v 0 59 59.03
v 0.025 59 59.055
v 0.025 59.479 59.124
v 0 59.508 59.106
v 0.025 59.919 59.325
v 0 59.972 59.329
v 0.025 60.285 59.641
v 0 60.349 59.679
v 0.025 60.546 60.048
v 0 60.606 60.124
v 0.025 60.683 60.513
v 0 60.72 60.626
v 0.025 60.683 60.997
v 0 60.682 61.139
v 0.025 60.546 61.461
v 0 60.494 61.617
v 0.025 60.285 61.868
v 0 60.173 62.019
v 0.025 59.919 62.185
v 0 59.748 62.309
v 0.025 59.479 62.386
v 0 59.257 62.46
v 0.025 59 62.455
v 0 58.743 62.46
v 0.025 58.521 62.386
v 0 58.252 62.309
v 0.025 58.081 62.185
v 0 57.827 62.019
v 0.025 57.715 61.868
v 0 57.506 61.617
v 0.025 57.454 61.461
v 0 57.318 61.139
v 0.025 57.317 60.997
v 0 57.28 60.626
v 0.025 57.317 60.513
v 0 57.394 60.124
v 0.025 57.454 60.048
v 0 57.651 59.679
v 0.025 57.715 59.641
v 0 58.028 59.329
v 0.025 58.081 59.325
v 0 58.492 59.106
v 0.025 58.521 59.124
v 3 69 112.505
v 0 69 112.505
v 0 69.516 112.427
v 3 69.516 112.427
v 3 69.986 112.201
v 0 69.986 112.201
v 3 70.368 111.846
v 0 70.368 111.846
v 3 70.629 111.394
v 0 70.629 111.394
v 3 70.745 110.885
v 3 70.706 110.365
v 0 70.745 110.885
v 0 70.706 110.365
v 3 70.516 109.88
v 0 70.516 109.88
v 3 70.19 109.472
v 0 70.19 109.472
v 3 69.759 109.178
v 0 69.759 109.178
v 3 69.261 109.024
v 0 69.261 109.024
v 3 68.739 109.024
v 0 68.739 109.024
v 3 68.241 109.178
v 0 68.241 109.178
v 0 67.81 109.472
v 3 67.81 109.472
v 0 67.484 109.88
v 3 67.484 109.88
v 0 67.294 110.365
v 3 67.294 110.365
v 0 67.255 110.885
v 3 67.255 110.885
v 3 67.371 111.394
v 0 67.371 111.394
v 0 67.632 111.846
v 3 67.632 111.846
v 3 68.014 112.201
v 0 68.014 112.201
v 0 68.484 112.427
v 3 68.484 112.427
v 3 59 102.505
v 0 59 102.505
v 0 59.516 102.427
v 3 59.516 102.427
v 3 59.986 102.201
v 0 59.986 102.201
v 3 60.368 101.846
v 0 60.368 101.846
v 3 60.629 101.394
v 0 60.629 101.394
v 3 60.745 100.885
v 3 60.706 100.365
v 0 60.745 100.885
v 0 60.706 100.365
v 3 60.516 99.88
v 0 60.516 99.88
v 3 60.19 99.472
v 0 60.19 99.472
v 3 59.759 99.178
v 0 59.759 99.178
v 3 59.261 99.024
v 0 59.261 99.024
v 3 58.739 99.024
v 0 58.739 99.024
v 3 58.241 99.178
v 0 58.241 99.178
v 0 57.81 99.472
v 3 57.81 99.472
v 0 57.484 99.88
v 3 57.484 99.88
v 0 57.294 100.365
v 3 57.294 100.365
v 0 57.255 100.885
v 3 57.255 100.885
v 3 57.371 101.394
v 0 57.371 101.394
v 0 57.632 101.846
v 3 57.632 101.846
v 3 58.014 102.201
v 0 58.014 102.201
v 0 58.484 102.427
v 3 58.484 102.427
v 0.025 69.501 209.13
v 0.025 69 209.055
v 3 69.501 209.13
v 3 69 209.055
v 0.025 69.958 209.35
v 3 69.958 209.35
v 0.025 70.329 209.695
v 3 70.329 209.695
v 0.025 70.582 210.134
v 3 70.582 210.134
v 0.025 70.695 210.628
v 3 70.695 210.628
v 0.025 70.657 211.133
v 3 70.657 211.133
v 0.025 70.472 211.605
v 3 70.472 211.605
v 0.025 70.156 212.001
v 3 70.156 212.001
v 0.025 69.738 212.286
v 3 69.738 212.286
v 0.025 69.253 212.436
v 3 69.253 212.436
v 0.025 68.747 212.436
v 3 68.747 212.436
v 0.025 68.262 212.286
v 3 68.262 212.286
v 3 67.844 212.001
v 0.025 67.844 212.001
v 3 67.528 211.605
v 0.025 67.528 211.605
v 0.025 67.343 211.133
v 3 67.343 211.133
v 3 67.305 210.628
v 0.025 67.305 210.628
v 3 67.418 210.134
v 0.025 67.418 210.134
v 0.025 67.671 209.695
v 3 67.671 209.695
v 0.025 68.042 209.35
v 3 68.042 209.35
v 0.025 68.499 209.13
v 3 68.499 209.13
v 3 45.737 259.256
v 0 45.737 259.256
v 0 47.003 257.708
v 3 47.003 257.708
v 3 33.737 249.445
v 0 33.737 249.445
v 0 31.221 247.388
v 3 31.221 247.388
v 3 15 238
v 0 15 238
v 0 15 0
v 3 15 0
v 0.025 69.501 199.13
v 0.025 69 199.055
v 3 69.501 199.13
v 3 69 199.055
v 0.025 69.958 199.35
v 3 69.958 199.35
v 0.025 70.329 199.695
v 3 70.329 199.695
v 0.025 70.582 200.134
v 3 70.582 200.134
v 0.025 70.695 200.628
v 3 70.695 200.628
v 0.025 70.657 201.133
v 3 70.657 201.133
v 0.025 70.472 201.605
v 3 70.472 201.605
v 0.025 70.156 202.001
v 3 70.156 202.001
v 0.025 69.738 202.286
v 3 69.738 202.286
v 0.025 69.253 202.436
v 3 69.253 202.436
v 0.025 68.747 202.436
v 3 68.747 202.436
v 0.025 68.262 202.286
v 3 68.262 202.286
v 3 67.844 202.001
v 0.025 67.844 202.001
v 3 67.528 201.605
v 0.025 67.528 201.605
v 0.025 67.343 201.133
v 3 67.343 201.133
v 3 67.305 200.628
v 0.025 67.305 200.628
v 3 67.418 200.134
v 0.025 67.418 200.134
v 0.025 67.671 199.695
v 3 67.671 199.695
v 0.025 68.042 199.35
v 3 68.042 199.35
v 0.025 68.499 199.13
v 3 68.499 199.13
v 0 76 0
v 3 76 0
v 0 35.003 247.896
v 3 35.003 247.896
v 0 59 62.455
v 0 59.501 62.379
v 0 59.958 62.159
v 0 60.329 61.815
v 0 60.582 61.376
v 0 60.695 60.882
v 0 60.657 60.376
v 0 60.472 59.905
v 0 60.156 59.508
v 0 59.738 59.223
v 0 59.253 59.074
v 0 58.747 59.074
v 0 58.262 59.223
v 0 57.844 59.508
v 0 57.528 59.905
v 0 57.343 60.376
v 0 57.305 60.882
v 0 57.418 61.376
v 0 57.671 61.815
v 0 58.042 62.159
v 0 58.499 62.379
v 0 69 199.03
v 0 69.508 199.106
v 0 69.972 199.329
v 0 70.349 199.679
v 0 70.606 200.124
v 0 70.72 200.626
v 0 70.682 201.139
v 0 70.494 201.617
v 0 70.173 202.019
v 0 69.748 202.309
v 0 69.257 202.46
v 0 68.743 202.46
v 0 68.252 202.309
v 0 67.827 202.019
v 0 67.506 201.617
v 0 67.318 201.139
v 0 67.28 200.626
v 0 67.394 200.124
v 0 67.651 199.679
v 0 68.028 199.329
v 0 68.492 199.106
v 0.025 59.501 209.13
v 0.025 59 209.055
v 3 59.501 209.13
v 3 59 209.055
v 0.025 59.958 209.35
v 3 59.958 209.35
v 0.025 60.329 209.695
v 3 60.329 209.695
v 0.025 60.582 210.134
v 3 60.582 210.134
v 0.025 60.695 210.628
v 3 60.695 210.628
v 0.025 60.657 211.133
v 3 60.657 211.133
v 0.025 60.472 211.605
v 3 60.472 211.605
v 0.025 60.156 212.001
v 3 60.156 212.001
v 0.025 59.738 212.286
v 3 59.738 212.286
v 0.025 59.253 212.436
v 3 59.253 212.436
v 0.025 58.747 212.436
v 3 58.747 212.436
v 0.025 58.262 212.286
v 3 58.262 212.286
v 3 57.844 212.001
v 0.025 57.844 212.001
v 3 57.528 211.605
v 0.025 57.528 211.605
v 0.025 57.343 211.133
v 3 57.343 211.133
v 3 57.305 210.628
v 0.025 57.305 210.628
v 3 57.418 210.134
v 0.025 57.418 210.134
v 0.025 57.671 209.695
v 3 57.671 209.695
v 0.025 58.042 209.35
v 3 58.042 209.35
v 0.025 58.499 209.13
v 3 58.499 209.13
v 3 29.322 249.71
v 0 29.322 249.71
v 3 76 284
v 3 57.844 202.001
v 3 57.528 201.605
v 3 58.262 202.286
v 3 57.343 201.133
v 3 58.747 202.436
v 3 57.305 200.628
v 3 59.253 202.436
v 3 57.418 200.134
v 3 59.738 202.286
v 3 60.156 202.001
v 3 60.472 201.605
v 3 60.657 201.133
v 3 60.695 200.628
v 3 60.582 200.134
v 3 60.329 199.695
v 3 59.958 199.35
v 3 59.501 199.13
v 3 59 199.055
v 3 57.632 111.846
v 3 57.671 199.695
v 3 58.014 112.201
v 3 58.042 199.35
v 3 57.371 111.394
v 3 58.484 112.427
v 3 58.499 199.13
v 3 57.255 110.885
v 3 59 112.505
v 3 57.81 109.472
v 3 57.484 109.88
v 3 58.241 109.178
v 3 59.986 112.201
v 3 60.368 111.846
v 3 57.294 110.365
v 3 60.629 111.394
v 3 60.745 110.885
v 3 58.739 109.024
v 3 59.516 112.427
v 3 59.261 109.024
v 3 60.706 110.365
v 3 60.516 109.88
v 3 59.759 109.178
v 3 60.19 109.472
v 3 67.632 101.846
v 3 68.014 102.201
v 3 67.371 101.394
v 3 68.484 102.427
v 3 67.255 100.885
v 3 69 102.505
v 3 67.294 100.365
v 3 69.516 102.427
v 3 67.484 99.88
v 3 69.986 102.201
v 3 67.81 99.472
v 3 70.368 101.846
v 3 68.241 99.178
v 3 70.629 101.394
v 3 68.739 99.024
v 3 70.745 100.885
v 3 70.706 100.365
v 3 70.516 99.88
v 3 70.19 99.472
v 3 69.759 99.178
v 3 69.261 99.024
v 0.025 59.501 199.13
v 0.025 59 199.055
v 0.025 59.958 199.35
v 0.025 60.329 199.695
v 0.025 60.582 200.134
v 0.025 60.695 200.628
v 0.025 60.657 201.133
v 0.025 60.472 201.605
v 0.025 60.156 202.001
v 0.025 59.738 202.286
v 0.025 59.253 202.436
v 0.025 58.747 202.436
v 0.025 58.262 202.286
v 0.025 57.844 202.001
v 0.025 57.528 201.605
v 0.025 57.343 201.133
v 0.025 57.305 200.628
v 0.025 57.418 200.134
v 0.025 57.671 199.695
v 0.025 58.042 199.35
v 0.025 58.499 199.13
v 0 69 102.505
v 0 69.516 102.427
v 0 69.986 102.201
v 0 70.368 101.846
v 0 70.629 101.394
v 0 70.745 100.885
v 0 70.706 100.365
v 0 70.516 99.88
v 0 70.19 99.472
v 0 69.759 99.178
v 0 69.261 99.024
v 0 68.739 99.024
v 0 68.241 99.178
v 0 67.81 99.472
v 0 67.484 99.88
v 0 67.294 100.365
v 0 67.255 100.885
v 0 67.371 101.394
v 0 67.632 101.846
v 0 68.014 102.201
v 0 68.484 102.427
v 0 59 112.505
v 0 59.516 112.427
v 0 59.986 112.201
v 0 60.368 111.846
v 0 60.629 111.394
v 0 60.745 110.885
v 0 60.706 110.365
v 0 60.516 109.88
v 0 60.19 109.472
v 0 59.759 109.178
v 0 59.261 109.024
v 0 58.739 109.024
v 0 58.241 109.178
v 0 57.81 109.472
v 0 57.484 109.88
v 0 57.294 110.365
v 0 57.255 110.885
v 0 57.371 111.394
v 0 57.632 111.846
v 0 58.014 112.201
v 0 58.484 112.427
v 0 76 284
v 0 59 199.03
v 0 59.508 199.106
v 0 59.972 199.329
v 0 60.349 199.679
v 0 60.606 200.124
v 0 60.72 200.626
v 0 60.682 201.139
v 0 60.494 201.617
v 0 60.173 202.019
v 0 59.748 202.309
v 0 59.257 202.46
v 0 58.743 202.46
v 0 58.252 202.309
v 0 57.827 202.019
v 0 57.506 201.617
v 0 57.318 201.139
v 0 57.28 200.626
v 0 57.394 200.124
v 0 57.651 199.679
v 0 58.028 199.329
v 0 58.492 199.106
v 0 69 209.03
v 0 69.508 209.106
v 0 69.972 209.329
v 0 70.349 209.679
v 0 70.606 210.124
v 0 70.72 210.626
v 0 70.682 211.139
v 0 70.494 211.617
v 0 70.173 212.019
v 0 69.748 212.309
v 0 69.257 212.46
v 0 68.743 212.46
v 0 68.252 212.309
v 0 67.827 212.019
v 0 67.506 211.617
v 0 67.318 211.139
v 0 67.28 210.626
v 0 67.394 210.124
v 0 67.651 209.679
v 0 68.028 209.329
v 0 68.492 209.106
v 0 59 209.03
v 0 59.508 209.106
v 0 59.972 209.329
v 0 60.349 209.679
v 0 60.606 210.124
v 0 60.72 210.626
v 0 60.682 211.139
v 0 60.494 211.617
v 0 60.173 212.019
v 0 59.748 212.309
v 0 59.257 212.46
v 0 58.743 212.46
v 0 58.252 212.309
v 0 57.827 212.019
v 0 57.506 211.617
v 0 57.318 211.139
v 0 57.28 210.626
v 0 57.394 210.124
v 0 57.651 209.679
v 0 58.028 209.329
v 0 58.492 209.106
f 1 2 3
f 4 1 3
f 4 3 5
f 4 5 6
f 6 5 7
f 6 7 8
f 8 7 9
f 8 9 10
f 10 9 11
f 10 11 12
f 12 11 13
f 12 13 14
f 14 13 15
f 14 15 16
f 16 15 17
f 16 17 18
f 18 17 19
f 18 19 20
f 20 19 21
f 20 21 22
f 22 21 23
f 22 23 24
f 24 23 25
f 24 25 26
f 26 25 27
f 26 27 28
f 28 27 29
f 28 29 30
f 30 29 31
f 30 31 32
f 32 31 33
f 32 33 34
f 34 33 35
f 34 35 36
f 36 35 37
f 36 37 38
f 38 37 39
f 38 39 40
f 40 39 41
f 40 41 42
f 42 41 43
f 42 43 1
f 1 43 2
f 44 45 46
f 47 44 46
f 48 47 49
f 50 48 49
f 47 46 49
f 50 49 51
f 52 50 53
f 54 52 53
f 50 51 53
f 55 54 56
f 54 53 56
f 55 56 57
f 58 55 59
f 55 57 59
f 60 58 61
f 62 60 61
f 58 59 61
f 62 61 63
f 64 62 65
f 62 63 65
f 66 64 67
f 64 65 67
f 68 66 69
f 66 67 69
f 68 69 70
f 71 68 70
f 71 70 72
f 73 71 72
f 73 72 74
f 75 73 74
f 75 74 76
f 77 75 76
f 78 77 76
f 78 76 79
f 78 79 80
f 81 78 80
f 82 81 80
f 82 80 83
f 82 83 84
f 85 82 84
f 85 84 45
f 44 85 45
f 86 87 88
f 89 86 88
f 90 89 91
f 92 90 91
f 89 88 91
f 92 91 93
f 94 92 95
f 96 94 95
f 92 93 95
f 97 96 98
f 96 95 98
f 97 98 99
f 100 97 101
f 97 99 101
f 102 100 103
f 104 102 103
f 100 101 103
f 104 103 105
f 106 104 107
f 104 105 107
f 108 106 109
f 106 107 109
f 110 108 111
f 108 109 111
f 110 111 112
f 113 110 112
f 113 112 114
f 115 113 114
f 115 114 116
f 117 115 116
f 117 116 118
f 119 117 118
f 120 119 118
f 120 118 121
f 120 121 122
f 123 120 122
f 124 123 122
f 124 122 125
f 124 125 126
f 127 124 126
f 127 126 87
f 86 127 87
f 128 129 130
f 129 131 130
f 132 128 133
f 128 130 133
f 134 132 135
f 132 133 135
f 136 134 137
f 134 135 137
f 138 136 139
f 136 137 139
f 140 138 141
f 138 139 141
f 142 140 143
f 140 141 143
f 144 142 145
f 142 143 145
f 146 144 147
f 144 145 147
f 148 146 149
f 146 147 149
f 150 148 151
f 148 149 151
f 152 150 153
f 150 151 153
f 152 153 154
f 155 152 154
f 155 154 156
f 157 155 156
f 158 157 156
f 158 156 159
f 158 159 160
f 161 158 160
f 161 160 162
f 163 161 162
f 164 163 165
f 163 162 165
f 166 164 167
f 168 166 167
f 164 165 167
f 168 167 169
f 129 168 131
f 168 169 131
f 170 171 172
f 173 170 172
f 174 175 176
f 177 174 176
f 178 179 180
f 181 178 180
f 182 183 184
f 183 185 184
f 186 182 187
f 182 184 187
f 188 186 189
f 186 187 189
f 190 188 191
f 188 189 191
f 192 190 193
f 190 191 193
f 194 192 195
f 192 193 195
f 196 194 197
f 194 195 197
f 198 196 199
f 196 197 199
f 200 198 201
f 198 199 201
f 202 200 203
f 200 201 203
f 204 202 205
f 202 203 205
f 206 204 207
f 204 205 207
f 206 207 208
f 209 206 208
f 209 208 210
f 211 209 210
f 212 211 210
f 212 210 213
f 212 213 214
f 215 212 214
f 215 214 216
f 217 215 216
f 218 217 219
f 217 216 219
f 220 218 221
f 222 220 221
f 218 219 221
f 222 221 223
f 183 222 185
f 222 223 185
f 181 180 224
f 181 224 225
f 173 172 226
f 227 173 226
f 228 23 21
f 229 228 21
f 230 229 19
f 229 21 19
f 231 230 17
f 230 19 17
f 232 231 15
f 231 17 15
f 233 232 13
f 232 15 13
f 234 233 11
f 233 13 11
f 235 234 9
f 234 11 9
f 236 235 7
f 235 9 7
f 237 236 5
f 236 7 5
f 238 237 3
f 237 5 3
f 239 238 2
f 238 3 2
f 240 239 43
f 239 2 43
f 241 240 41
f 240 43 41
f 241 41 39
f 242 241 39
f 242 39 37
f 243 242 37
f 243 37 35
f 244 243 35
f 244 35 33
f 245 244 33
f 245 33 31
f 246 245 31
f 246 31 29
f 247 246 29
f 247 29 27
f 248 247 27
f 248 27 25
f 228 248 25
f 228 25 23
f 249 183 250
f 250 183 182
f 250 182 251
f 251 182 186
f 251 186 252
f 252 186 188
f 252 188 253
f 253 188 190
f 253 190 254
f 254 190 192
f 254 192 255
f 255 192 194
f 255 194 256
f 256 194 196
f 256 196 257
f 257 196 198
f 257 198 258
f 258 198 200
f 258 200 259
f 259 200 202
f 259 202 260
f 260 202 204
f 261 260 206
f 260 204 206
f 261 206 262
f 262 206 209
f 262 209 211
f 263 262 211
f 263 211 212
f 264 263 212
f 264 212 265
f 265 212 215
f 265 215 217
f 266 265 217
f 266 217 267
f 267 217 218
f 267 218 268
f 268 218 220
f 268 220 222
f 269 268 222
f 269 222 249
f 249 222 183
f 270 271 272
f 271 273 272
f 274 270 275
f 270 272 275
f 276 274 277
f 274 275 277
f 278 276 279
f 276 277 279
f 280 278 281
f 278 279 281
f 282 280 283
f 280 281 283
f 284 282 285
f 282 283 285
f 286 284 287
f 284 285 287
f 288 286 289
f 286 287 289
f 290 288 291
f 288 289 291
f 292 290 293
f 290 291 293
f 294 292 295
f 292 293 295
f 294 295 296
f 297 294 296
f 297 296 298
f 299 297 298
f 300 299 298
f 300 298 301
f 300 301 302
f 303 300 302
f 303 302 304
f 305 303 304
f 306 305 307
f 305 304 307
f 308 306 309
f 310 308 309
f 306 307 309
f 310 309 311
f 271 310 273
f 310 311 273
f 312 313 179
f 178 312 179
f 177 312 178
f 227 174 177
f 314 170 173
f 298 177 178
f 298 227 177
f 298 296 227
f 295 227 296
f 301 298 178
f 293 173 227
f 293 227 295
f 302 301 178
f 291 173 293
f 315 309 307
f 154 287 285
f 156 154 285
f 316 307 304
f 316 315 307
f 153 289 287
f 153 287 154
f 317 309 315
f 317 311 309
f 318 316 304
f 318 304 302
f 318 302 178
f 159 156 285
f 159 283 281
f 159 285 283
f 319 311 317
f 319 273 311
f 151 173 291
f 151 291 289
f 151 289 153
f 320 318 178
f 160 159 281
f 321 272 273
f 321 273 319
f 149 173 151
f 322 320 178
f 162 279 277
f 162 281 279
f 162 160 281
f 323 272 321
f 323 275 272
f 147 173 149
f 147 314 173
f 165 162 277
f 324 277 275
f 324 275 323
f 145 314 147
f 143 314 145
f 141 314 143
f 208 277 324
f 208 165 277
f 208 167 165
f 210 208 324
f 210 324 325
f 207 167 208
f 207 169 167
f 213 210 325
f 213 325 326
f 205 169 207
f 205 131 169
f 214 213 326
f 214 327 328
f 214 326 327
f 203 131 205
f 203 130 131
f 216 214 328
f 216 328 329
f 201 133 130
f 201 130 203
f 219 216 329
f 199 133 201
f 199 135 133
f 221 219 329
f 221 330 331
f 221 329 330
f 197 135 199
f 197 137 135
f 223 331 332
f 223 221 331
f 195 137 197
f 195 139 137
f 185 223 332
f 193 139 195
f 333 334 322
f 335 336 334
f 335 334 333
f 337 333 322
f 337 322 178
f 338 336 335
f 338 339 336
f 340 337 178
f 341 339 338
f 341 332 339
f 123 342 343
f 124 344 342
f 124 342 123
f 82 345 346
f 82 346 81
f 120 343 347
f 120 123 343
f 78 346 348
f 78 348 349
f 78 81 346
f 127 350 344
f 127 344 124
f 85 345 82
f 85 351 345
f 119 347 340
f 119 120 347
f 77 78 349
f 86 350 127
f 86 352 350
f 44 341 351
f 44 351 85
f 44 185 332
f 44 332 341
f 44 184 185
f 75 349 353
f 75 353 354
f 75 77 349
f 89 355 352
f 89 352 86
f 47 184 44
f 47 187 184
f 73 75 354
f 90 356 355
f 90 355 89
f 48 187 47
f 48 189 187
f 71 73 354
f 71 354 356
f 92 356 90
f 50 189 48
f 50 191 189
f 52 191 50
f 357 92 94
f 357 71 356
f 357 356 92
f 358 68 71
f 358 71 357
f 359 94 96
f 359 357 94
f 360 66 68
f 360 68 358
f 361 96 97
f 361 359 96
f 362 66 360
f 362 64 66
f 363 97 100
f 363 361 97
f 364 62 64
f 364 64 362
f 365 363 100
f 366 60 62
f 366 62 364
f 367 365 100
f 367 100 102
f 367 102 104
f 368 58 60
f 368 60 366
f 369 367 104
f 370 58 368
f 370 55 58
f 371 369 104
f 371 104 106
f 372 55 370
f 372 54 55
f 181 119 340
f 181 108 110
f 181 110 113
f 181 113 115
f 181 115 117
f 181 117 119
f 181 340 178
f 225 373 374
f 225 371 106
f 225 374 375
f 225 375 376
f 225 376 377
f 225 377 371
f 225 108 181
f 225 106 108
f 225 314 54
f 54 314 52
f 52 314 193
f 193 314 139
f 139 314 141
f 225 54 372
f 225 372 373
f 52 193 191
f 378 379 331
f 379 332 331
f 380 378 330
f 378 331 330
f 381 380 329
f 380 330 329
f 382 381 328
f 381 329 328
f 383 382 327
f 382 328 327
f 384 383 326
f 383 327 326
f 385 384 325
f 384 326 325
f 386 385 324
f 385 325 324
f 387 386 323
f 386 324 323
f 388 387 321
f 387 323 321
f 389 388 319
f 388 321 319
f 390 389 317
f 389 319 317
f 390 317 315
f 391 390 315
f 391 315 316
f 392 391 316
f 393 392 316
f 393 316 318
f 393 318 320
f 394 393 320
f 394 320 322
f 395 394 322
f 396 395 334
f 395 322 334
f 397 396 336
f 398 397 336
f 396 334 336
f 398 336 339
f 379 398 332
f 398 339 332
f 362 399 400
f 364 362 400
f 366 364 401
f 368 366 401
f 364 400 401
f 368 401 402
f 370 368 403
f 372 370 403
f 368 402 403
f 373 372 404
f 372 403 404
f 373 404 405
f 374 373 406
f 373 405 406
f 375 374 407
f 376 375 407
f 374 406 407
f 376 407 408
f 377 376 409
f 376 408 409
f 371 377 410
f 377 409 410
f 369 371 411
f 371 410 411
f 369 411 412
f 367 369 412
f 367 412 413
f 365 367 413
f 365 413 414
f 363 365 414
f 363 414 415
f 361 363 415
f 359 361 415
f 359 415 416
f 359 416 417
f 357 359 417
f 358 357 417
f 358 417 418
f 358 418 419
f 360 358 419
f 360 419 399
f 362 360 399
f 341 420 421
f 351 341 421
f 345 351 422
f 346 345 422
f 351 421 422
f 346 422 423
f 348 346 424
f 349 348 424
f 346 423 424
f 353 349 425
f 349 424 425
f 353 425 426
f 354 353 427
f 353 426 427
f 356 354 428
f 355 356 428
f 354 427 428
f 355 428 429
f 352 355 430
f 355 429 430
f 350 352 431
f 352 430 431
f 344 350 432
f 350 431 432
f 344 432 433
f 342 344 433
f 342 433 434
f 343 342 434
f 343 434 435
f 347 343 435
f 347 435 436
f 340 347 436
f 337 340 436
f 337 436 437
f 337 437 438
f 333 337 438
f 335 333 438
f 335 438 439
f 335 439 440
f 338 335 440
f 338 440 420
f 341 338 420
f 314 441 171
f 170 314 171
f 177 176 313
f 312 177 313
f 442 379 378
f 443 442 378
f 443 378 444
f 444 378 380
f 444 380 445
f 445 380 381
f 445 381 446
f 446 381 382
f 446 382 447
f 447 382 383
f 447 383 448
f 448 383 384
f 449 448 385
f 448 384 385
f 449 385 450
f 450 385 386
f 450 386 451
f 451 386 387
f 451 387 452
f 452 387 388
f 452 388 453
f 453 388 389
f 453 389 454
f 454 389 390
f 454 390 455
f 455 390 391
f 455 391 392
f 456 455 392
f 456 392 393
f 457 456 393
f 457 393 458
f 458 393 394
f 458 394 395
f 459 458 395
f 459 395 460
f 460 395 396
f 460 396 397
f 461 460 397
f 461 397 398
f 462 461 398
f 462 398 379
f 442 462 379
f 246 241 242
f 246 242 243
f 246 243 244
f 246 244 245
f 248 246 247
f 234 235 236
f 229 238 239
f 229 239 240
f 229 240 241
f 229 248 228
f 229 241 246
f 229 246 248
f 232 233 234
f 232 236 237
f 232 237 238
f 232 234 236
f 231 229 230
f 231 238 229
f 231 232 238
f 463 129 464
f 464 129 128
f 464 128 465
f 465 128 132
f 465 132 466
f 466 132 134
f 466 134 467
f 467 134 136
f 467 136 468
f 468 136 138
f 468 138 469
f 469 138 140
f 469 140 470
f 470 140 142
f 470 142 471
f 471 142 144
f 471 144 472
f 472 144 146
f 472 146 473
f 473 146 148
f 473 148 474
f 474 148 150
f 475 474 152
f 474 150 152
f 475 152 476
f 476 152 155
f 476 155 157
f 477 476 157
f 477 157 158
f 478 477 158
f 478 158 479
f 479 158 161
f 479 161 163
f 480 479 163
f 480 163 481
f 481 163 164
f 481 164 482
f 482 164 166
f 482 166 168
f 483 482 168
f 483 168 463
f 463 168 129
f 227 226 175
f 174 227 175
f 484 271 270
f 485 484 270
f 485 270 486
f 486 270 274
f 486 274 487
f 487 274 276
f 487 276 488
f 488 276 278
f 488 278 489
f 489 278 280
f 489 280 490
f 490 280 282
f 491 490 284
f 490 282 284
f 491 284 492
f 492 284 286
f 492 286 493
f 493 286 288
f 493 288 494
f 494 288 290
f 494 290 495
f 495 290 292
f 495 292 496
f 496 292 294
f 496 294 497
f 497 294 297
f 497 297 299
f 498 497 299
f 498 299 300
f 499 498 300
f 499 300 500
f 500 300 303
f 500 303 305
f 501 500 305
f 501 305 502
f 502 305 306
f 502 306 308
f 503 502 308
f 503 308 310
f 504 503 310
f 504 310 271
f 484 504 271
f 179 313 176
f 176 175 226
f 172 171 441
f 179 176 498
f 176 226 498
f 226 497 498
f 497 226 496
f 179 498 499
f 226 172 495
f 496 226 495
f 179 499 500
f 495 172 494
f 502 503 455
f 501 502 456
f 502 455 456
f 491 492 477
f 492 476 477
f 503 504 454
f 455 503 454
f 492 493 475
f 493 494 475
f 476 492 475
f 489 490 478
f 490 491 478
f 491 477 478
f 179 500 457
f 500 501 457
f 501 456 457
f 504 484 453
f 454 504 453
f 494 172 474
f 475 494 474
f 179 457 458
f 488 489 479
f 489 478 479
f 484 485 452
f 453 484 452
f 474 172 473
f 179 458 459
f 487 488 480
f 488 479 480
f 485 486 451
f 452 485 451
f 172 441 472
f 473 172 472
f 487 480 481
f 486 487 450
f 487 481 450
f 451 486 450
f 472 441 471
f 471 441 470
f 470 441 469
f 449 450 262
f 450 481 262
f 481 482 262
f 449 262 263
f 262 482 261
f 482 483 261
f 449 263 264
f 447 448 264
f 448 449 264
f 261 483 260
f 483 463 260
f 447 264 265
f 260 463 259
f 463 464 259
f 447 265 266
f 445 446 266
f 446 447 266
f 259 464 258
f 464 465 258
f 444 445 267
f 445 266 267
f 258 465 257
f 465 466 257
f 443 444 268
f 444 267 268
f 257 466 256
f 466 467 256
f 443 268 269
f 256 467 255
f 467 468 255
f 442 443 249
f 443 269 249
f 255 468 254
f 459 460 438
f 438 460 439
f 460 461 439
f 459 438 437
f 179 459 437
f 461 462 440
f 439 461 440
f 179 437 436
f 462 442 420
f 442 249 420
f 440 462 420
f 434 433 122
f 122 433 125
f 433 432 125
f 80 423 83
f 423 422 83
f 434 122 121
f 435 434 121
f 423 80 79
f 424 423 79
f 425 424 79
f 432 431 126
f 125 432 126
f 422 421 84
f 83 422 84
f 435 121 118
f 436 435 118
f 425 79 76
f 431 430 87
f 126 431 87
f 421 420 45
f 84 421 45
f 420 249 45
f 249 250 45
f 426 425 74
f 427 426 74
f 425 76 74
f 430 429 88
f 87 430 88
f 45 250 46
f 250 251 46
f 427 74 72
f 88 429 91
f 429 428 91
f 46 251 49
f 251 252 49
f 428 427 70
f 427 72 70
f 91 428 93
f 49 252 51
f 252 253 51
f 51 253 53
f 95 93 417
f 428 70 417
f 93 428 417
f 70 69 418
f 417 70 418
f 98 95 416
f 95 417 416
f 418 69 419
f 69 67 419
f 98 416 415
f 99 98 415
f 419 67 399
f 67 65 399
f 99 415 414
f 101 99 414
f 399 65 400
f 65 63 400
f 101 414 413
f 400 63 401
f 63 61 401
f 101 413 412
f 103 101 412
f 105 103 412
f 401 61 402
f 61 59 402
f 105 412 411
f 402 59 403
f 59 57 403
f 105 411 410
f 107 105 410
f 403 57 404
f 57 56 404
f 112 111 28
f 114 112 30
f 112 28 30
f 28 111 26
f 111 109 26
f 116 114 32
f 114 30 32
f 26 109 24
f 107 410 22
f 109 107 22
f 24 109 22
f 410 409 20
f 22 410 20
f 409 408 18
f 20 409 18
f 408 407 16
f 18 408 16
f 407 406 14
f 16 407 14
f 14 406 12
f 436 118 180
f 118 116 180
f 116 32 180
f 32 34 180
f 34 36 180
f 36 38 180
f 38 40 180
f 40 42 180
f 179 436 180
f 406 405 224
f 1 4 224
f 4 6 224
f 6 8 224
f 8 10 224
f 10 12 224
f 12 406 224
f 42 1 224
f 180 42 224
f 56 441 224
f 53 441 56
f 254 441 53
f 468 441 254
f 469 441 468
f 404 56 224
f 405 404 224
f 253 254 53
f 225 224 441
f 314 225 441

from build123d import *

# Parameters (mm, degrees)
SKETCH1_W                      = 3
SKETCH1_H                      = 76
BOSS_EXTRUDE1_DEPTH            = 220
M3_CLEARANCE_HOLE1_D           = 3.4
M3_CLEARANCE_HOLE1_CSINK_D     = 3.45
M3_CLEARANCE_HOLE1_CSINK_ANGLE = 90
SKETCH4_W                      = 220
SKETCH4_H                      = 15
CUT_EXTRUDE1_DEPTH             = 233.776717049
SKETCH5_R                      = 1.75
CUT_EXTRUDE2_DEPTH             = 233.776717049
BOSS_EXTRUDE2_START            = -3
SKETCH6_R                      = 1.725
SKETCH6_R_2                    = 1.7
BOSS_EXTRUDE2_DEPTH            = 3
BOSS_EXTRUDE3_DEPTH            = 3


with BuildPart() as part:
    # Sketch1 → Boss-Extrude1 (new body)
    with BuildSketch(Plane.XY):
        with Locations((1.5, 38)):
            Rectangle(SKETCH1_W, SKETCH1_H)
    extrude(amount=BOSS_EXTRUDE1_DEPTH)

    # M3 Clearance Hole1 (through all)
    with Locations(Plane.ZY):
        with Locations((50.754682085, 59), (60.754682085, 59), (60.754682085, 69), (50.754682085, 69), (200.754682085, 59), (200.754682085, 69), (210.754682085, 59), (210.754682085, 69)):
            CounterSinkHole(M3_CLEARANCE_HOLE1_D / 2, M3_CLEARANCE_HOLE1_CSINK_D / 2, counter_sink_angle=M3_CLEARANCE_HOLE1_CSINK_ANGLE)

    # Sketch4 → Cut-Extrude1 (cut, through all)
    with BuildSketch(Plane.ZY):
        with Locations((110, 7.5)):
            Rectangle(SKETCH4_W, SKETCH4_H)
    extrude(amount=-CUT_EXTRUDE1_DEPTH, mode=Mode.SUBTRACT)

    # Sketch5 → Cut-Extrude2 (cut, through all)
    with BuildSketch(Plane.ZY):
        with Locations((110.754682085, 69)):
            Circle(SKETCH5_R)
        with Locations((100.754682085, 69)):
            Circle(SKETCH5_R)
        with Locations((100.754682085, 59)):
            Circle(SKETCH5_R)
        with Locations((110.754682085, 59)):
            Circle(SKETCH5_R)
    extrude(amount=-CUT_EXTRUDE2_DEPTH, mode=Mode.SUBTRACT)

    # Sketch6 → Boss-Extrude2 (add)
    with BuildSketch(Plane.ZY.offset(BOSS_EXTRUDE2_START)):
        with Locations((50.754682085, 59)):
            Circle(SKETCH6_R)
        with Locations((60.754682085, 59)):
            Circle(SKETCH6_R_2)
        with Locations((60.754682085, 69)):
            Circle(SKETCH6_R)
        with Locations((50.754682085, 69)):
            Circle(SKETCH6_R)
    extrude(amount=BOSS_EXTRUDE2_DEPTH)

    # Sketch7 → Boss-Extrude3 (add)
    with BuildSketch(Plane.ZY):
        Polygon((220, 76), (284, 76), (259.255982343, 45.736716068), (257.707645299, 47.00267515), (247.896462411, 35.003063059), (249.444799455, 33.737103977), (247.387615946, 31.22105628), (249.710121512, 29.322117657), (238, 15), (220, 15), align=None)
    extrude(amount=-BOSS_EXTRUDE3_DEPTH)


solid = part.part
